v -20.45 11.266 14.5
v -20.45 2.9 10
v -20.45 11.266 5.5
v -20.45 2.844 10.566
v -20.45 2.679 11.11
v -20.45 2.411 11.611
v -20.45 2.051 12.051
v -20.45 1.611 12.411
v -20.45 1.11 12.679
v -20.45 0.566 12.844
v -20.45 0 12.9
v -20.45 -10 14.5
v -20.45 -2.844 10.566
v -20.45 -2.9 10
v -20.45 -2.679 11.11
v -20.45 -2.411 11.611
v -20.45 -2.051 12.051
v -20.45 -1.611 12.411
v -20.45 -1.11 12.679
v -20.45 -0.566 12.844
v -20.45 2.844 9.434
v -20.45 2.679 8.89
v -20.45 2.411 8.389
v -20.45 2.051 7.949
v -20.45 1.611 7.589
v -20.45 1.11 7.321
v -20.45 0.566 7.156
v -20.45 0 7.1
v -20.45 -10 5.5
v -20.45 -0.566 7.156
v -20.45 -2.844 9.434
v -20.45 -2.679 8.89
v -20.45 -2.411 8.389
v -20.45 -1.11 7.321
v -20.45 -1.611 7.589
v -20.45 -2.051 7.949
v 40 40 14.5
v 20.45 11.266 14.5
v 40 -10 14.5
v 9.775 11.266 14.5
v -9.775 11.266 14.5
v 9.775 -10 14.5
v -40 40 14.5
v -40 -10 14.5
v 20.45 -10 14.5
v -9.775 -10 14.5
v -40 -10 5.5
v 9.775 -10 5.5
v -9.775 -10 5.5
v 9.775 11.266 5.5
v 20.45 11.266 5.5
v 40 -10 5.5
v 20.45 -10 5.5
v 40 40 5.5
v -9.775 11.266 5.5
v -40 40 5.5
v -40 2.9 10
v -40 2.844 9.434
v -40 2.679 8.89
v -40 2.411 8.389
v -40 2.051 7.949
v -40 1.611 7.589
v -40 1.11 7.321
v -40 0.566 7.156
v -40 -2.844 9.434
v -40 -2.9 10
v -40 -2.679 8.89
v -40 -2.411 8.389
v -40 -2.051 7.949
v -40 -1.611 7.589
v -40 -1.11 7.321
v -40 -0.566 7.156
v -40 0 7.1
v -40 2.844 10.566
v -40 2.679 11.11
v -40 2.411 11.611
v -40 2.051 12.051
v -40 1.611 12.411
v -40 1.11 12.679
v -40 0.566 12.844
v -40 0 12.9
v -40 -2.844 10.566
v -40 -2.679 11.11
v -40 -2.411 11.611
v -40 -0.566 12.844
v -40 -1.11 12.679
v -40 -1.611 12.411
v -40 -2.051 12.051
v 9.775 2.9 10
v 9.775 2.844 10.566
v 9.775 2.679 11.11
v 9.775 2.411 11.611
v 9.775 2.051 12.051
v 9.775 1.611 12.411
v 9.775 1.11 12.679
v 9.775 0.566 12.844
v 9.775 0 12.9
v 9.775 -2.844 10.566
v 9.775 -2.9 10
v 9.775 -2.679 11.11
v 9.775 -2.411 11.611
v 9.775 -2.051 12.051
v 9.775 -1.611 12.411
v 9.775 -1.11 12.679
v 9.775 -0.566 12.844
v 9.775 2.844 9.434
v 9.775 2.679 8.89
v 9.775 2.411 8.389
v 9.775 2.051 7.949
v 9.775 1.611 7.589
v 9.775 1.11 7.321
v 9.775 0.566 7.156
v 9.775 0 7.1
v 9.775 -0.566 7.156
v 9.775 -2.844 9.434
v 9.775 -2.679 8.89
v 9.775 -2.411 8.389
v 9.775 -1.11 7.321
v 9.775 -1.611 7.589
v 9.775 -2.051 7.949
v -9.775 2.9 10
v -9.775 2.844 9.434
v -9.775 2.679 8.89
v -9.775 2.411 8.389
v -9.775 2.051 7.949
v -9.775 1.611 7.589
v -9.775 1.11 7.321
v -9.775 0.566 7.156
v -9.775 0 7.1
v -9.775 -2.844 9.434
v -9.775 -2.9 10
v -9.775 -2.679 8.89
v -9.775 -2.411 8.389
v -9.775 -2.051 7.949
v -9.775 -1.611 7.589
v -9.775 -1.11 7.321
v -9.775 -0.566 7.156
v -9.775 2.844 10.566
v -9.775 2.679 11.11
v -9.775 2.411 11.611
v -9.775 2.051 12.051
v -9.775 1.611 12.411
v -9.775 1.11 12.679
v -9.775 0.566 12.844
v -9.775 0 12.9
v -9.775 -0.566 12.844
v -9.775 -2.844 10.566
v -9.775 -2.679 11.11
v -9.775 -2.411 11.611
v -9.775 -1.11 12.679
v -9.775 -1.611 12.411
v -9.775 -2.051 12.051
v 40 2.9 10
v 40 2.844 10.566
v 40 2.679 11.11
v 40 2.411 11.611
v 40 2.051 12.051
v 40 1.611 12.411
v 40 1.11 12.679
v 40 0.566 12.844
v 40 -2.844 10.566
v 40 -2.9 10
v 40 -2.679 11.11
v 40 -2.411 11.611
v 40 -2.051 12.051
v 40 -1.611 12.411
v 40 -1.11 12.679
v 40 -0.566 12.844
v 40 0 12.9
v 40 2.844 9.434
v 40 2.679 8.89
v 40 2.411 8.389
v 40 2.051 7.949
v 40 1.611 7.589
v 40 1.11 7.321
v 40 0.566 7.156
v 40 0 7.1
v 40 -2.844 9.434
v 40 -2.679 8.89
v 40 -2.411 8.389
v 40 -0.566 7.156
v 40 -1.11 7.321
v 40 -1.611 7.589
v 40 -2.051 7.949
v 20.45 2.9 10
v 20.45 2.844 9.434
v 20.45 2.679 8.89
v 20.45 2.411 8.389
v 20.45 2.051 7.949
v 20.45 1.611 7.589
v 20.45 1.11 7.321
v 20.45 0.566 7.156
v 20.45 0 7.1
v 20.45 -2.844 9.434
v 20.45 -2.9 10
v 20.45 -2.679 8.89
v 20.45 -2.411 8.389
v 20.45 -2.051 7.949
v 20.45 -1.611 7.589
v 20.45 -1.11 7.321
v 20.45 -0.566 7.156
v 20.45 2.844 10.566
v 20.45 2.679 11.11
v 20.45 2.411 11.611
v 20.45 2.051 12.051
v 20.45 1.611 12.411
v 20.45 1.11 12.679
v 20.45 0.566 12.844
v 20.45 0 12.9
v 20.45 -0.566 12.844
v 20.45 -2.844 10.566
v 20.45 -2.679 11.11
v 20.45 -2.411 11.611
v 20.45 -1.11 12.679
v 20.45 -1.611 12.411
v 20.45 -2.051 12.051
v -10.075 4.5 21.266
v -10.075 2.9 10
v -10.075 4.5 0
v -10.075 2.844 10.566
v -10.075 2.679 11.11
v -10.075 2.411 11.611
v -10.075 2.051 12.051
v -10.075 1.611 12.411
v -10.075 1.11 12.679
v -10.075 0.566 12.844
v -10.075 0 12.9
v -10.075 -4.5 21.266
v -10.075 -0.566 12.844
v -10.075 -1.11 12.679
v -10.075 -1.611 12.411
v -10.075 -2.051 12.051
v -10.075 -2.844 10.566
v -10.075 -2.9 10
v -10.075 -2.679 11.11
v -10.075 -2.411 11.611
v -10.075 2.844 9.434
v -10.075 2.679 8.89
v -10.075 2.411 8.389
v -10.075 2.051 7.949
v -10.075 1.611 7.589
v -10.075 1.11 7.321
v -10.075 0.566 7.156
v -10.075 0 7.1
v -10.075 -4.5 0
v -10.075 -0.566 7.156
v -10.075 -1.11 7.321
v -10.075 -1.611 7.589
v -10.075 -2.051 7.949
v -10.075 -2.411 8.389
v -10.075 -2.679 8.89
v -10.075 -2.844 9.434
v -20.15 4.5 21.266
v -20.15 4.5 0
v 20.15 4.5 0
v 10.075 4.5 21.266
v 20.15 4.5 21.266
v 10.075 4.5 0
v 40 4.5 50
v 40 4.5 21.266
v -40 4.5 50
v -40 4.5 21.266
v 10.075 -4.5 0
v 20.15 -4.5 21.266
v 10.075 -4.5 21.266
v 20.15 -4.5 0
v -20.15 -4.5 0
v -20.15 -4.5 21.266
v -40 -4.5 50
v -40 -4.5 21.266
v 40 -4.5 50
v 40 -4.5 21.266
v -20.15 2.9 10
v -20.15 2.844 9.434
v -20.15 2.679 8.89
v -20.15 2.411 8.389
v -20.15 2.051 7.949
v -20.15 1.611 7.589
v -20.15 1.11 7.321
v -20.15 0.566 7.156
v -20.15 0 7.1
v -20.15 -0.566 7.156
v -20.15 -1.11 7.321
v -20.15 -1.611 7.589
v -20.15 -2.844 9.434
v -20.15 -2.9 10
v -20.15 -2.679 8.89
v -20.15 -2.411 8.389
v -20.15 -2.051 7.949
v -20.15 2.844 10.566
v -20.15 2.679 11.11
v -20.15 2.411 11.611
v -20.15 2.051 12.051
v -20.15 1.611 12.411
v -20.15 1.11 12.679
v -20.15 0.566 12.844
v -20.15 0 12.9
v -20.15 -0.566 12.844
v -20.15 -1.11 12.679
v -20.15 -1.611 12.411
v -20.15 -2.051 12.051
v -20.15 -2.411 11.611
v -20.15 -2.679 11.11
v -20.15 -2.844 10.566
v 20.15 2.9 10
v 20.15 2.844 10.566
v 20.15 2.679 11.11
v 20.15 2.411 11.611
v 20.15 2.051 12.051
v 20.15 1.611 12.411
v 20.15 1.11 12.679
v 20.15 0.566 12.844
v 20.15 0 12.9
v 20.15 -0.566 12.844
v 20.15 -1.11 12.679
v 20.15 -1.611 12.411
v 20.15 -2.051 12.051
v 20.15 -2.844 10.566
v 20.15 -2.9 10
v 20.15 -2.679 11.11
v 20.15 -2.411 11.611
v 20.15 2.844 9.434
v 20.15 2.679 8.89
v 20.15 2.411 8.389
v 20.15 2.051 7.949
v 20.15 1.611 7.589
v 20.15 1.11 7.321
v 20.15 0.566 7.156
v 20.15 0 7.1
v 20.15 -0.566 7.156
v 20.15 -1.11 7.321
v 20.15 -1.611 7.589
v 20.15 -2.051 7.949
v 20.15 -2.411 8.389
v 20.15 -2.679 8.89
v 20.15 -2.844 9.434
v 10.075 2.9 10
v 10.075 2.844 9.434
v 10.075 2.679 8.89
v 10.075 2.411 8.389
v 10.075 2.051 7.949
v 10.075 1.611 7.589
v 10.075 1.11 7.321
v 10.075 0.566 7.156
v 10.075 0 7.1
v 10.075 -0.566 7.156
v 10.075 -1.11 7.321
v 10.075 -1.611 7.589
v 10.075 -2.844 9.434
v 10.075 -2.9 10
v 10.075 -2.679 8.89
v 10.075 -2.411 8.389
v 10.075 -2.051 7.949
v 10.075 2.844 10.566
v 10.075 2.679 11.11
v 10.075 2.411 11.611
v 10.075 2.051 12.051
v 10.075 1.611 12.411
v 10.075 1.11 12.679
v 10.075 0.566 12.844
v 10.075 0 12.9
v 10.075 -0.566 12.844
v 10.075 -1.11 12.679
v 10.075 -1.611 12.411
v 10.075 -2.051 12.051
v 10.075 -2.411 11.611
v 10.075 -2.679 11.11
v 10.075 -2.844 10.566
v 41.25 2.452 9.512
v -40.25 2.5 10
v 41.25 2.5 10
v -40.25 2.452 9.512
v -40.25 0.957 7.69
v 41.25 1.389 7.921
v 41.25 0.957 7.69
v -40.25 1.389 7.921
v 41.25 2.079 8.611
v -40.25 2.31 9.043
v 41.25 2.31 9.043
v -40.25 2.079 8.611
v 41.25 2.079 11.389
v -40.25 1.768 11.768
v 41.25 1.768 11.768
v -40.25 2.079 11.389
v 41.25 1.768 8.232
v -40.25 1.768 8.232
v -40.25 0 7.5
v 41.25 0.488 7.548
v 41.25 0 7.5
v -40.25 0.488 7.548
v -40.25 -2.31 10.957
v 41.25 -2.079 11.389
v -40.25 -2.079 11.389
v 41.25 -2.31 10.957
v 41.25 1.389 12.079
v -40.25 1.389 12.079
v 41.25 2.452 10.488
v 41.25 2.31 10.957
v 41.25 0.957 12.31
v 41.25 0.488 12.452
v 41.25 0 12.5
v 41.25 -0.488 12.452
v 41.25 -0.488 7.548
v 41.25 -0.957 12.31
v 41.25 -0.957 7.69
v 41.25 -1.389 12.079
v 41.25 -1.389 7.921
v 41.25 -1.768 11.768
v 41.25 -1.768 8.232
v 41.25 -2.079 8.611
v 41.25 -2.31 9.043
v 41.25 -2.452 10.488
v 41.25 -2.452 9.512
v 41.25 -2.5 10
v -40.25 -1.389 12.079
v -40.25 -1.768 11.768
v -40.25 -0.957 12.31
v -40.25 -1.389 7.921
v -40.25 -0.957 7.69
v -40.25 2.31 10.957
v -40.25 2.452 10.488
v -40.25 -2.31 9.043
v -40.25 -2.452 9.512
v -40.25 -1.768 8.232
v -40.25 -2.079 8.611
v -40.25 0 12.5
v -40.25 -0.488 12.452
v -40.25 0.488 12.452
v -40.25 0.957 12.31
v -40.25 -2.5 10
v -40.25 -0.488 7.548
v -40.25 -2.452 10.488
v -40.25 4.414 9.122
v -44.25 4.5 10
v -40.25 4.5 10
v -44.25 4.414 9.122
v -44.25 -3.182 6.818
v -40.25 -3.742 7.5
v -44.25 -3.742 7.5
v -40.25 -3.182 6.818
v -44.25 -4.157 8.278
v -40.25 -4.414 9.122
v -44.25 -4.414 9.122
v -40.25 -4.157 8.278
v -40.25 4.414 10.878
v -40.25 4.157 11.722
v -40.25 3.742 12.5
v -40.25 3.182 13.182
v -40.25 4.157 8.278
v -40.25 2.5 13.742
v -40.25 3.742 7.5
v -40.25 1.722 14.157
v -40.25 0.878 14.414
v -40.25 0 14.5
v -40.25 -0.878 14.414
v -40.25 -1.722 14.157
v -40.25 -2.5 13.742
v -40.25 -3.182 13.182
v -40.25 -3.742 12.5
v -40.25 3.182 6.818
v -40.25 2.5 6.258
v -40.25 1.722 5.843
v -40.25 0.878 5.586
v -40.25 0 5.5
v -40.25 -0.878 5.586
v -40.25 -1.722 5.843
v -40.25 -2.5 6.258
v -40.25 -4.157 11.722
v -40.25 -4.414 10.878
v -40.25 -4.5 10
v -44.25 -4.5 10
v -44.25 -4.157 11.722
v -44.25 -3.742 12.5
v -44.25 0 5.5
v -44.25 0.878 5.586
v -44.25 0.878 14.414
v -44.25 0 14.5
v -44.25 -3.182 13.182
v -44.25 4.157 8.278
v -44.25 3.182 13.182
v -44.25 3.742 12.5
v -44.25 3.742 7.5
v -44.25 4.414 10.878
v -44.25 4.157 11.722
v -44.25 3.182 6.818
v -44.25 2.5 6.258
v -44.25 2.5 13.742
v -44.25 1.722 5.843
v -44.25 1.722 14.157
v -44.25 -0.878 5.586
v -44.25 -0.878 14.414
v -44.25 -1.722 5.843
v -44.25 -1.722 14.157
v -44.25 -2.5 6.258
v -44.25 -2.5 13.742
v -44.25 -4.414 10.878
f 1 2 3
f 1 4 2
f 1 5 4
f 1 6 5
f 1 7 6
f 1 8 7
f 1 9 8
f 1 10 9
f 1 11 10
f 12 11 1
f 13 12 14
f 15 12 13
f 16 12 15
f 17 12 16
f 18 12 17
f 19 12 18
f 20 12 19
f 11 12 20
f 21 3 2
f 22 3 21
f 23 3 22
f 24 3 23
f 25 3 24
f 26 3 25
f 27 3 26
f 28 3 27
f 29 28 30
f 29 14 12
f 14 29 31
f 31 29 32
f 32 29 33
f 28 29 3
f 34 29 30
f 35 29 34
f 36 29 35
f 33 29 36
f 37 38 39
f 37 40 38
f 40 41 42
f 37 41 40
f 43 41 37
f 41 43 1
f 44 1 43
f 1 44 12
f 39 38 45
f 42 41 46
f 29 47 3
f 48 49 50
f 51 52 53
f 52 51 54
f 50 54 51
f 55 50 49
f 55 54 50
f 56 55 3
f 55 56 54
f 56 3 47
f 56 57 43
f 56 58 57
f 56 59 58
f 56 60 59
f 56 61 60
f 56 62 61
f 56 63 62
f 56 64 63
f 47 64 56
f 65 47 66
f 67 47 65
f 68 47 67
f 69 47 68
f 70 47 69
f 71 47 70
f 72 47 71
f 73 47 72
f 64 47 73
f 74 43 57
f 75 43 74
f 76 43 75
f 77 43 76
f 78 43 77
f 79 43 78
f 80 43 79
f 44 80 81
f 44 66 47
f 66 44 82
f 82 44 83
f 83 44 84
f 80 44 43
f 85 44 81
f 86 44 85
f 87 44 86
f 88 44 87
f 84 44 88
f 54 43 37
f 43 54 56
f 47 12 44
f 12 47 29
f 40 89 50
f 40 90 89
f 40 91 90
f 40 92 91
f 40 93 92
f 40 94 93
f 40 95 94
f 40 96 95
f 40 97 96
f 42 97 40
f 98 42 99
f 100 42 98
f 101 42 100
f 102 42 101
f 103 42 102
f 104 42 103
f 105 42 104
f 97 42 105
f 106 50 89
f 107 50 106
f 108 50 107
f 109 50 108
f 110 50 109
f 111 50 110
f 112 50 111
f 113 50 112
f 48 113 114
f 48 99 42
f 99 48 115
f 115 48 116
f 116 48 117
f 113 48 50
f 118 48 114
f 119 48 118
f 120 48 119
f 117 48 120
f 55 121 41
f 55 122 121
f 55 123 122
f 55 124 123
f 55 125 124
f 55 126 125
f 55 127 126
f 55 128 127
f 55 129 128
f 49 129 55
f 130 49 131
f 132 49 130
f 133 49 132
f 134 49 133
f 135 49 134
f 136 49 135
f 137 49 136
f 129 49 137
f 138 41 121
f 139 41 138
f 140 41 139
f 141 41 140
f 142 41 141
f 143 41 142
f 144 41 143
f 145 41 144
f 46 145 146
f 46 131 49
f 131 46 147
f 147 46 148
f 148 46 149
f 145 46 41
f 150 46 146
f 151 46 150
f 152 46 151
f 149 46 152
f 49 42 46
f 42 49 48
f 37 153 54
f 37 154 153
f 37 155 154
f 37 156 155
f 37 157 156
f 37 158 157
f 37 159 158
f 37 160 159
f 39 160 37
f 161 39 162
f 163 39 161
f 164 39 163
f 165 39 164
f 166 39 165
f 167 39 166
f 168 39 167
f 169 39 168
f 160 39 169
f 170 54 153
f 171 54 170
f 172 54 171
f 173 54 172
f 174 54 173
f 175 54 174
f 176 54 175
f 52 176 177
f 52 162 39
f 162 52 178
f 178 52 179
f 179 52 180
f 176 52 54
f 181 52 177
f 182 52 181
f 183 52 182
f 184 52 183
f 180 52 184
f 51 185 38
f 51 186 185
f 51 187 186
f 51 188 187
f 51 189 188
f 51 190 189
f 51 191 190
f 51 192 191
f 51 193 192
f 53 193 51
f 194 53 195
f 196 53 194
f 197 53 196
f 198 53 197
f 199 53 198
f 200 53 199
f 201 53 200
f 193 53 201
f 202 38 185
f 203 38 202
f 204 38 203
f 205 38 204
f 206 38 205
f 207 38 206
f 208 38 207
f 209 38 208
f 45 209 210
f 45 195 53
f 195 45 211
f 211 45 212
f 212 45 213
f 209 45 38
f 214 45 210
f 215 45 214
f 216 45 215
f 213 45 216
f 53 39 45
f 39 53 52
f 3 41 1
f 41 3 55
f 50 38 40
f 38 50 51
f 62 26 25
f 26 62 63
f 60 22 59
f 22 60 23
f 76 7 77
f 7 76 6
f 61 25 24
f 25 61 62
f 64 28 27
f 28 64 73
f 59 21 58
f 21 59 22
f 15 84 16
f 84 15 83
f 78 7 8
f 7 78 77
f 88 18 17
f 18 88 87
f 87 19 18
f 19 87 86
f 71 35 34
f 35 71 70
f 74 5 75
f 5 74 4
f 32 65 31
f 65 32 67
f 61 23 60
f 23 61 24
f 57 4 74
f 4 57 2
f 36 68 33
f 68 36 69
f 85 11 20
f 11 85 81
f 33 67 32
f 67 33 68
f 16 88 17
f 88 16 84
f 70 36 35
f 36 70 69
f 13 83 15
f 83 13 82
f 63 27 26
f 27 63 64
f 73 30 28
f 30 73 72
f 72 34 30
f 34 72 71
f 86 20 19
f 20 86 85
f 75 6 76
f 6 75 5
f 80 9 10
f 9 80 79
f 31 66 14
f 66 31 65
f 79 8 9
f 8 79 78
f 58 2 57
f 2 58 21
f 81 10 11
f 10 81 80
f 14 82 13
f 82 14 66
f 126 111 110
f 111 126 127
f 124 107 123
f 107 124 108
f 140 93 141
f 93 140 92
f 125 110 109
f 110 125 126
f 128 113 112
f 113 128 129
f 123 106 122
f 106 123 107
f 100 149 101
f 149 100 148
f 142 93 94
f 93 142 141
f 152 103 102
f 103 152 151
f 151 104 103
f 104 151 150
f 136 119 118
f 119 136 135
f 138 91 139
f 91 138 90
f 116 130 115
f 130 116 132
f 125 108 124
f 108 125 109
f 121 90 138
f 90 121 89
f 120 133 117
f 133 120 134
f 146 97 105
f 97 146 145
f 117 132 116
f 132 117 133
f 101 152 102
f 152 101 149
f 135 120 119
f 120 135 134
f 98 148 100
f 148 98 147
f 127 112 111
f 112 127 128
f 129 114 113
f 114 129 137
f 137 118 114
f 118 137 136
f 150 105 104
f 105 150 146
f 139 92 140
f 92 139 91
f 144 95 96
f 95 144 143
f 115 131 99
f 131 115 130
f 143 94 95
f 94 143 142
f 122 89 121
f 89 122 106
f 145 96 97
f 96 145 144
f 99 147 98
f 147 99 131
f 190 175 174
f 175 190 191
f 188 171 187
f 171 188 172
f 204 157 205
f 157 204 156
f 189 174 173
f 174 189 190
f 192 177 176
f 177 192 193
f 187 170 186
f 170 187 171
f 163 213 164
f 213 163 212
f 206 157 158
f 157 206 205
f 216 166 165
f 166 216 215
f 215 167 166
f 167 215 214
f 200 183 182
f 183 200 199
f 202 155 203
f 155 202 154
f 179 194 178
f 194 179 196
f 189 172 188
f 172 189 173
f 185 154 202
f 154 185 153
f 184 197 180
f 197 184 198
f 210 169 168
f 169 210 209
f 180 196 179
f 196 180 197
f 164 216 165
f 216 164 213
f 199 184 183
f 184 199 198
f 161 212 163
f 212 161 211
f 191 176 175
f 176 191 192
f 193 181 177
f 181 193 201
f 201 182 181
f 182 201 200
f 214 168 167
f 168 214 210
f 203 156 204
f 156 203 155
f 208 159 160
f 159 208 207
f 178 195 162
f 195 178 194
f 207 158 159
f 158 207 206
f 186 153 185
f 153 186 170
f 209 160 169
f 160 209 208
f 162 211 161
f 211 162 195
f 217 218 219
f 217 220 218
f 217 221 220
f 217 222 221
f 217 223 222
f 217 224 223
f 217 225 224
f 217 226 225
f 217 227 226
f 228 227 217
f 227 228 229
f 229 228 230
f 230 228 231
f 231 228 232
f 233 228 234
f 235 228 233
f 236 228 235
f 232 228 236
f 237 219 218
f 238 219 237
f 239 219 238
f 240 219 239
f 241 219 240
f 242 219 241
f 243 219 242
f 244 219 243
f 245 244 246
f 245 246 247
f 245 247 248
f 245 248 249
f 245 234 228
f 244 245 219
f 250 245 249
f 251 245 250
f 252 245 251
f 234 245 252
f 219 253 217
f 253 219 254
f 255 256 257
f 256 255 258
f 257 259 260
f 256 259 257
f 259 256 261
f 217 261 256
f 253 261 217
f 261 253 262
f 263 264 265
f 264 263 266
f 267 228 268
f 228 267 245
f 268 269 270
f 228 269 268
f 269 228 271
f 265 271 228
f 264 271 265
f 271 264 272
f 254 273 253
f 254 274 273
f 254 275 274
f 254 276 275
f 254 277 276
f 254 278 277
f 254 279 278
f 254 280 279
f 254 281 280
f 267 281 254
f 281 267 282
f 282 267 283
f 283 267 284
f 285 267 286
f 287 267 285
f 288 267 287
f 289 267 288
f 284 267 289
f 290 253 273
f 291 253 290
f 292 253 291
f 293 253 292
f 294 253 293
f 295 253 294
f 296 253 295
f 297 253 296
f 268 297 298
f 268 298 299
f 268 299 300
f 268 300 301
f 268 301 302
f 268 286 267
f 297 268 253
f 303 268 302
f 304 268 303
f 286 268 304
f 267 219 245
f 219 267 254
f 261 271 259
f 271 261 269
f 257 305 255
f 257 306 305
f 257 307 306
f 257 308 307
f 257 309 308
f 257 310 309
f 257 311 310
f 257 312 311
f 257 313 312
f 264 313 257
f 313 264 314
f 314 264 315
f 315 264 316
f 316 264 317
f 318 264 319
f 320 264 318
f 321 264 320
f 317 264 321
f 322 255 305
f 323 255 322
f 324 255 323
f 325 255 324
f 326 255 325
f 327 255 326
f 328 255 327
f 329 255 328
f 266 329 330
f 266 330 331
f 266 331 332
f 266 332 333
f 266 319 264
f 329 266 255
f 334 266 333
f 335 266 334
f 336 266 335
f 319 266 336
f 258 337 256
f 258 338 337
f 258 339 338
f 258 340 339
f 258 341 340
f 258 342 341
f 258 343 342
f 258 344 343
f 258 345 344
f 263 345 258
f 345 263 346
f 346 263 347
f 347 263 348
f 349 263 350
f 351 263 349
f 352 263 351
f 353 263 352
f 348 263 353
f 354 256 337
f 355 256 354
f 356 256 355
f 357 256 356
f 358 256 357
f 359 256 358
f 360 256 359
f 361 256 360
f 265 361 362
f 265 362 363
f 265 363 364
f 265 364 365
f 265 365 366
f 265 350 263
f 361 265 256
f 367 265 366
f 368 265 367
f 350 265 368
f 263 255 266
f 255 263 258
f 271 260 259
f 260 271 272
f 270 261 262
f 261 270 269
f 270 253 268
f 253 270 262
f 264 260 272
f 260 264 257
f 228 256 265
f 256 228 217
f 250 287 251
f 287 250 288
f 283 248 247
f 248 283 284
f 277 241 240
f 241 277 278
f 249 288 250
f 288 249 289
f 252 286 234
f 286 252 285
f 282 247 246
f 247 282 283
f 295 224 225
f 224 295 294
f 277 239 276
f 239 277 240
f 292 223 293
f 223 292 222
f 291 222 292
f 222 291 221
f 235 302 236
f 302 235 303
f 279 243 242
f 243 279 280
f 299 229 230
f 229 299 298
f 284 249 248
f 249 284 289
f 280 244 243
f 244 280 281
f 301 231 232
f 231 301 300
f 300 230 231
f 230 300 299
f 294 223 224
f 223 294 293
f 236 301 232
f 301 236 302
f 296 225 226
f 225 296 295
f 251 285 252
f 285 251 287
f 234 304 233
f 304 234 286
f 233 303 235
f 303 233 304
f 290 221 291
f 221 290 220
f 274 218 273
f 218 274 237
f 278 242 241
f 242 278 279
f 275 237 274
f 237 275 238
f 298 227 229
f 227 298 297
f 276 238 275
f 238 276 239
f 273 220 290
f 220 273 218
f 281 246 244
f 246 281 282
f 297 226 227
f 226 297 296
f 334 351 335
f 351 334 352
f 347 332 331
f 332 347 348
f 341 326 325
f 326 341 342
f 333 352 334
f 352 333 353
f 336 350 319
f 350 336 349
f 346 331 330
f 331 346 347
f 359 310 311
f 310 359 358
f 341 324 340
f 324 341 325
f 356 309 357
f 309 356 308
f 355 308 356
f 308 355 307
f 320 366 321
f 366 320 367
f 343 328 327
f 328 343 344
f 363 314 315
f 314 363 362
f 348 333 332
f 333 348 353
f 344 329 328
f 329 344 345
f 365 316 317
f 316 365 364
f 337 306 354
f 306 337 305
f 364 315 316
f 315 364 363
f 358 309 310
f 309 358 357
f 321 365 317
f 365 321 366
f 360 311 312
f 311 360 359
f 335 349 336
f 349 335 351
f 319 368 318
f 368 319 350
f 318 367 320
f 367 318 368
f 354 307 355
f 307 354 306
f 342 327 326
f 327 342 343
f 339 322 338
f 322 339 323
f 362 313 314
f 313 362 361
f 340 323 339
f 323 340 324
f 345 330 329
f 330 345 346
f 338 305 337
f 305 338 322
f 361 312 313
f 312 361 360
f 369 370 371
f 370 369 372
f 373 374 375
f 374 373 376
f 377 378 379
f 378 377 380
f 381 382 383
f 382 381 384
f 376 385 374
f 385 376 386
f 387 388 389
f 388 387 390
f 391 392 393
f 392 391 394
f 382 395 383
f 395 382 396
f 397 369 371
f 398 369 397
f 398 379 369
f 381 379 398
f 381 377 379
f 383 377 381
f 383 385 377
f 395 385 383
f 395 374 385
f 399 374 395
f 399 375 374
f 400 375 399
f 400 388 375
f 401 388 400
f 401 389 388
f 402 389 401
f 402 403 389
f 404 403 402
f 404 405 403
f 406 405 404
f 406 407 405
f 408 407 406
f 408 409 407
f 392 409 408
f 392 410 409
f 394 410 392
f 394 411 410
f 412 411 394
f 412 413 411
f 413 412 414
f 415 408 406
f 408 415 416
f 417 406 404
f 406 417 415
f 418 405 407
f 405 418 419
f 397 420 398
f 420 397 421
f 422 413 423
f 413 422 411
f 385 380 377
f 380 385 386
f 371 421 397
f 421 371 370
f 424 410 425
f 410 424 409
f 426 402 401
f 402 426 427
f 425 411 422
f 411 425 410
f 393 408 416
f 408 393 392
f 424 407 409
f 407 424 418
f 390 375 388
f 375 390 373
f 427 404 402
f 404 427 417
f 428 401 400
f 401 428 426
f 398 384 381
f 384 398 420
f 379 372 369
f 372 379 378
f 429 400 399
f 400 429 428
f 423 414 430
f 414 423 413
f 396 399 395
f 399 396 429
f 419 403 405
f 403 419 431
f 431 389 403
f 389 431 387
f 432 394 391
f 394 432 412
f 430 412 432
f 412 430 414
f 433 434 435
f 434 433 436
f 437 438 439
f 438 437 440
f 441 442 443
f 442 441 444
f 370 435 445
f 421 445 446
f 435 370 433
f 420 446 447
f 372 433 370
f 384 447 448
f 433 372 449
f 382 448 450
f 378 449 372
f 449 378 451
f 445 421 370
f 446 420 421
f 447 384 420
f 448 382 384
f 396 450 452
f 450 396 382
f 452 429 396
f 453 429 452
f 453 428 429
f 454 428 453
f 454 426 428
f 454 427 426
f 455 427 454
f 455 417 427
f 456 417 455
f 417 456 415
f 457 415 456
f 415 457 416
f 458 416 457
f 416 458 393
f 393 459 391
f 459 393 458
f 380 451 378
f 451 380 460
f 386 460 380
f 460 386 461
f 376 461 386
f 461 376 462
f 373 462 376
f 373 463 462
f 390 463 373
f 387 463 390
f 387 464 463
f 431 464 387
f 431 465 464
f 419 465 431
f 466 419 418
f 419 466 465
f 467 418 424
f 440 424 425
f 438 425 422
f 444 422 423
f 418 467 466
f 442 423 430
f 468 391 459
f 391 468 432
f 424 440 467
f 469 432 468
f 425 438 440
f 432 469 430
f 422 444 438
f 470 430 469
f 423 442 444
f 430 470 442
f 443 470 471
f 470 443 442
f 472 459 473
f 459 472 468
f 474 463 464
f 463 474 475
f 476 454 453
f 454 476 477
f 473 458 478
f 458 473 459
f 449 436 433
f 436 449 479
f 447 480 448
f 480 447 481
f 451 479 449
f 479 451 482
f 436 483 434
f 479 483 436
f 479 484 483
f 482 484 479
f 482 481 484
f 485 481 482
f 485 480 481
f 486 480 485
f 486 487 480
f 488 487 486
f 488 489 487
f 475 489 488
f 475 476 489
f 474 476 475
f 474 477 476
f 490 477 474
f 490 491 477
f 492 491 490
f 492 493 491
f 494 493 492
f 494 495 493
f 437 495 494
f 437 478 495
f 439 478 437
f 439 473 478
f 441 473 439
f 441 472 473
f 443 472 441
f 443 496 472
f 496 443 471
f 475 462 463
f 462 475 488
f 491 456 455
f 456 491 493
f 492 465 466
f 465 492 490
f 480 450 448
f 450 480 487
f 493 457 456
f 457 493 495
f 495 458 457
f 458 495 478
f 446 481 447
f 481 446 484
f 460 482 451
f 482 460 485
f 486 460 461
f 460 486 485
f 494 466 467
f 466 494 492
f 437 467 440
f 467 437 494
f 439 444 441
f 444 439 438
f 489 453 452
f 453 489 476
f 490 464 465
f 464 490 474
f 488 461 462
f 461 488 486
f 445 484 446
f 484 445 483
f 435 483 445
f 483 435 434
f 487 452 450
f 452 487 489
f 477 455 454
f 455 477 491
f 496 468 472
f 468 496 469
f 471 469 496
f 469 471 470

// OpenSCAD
$fn = 32;

// ------------------------------------------------------------------------
// Butt hinge: hinge 80 mm, leaf swung 270 deg
// Every part is its own module, assembly() places every instance.
// ------------------------------------------------------------------------

// --- part 1 ---
module hinge_base() {
  difference() {
    union() {
      translate([-40, -10, -4.5]) cube([19.55, 50, 9]);
      translate([-9.775, -10, -4.5]) cube([19.55, 50, 9]);
      translate([20.45, -10, -4.5]) cube([19.55, 50, 9]);
      translate([-40, 11.266, -4.5]) cube([80, 28.734, 9]);
    }
    translate([-30.225, 0, 0]) rotate([0, 90, 0]) cylinder(h = 21.55, d = 5.8, center = true);
    translate([0, 0, 0]) rotate([0, 90, 0]) cylinder(h = 21.55, d = 5.8, center = true);
    translate([30.225, 0, 0]) rotate([0, 90, 0]) cylinder(h = 21.55, d = 5.8, center = true);
  }
}

// --- part 2 ---
module hinge_mover() {
  difference() {
    union() {
      translate([-20.15, -40, -4.5]) cube([10.075, 50, 9]);
      translate([10.075, -40, -4.5]) cube([10.075, 50, 9]);
      translate([-40, -40, -4.5]) cube([80, 28.734, 9]);
    }
    translate([-15.113, 0, 0]) rotate([0, 90, 0]) cylinder(h = 12.075, d = 5.8, center = true);
    translate([15.113, 0, 0]) rotate([0, 90, 0]) cylinder(h = 12.075, d = 5.8, center = true);
  }
}

// --- part 3 ---
module hinge_pin() {
  rotate([0, 90, 0]) cylinder(h = 82.5, d = 5, center = true);
  translate([-44.25, 0, 0]) rotate([0, 90, 0]) cylinder(h = 4, d = 9);
}

// --- assembly ---
module assembly() {
  color([0.80, 0.24, 0.20]) translate([0, 0, 10]) rotate([0, 0, 0]) hinge_base();
  color([0.20, 0.45, 0.75]) translate([0, 0, 10]) rotate([270, 0, 0]) hinge_mover();
  color([0.25, 0.62, 0.32]) translate([0, 0, 10]) rotate([0, 0, 0]) hinge_pin();
}

assembly();
